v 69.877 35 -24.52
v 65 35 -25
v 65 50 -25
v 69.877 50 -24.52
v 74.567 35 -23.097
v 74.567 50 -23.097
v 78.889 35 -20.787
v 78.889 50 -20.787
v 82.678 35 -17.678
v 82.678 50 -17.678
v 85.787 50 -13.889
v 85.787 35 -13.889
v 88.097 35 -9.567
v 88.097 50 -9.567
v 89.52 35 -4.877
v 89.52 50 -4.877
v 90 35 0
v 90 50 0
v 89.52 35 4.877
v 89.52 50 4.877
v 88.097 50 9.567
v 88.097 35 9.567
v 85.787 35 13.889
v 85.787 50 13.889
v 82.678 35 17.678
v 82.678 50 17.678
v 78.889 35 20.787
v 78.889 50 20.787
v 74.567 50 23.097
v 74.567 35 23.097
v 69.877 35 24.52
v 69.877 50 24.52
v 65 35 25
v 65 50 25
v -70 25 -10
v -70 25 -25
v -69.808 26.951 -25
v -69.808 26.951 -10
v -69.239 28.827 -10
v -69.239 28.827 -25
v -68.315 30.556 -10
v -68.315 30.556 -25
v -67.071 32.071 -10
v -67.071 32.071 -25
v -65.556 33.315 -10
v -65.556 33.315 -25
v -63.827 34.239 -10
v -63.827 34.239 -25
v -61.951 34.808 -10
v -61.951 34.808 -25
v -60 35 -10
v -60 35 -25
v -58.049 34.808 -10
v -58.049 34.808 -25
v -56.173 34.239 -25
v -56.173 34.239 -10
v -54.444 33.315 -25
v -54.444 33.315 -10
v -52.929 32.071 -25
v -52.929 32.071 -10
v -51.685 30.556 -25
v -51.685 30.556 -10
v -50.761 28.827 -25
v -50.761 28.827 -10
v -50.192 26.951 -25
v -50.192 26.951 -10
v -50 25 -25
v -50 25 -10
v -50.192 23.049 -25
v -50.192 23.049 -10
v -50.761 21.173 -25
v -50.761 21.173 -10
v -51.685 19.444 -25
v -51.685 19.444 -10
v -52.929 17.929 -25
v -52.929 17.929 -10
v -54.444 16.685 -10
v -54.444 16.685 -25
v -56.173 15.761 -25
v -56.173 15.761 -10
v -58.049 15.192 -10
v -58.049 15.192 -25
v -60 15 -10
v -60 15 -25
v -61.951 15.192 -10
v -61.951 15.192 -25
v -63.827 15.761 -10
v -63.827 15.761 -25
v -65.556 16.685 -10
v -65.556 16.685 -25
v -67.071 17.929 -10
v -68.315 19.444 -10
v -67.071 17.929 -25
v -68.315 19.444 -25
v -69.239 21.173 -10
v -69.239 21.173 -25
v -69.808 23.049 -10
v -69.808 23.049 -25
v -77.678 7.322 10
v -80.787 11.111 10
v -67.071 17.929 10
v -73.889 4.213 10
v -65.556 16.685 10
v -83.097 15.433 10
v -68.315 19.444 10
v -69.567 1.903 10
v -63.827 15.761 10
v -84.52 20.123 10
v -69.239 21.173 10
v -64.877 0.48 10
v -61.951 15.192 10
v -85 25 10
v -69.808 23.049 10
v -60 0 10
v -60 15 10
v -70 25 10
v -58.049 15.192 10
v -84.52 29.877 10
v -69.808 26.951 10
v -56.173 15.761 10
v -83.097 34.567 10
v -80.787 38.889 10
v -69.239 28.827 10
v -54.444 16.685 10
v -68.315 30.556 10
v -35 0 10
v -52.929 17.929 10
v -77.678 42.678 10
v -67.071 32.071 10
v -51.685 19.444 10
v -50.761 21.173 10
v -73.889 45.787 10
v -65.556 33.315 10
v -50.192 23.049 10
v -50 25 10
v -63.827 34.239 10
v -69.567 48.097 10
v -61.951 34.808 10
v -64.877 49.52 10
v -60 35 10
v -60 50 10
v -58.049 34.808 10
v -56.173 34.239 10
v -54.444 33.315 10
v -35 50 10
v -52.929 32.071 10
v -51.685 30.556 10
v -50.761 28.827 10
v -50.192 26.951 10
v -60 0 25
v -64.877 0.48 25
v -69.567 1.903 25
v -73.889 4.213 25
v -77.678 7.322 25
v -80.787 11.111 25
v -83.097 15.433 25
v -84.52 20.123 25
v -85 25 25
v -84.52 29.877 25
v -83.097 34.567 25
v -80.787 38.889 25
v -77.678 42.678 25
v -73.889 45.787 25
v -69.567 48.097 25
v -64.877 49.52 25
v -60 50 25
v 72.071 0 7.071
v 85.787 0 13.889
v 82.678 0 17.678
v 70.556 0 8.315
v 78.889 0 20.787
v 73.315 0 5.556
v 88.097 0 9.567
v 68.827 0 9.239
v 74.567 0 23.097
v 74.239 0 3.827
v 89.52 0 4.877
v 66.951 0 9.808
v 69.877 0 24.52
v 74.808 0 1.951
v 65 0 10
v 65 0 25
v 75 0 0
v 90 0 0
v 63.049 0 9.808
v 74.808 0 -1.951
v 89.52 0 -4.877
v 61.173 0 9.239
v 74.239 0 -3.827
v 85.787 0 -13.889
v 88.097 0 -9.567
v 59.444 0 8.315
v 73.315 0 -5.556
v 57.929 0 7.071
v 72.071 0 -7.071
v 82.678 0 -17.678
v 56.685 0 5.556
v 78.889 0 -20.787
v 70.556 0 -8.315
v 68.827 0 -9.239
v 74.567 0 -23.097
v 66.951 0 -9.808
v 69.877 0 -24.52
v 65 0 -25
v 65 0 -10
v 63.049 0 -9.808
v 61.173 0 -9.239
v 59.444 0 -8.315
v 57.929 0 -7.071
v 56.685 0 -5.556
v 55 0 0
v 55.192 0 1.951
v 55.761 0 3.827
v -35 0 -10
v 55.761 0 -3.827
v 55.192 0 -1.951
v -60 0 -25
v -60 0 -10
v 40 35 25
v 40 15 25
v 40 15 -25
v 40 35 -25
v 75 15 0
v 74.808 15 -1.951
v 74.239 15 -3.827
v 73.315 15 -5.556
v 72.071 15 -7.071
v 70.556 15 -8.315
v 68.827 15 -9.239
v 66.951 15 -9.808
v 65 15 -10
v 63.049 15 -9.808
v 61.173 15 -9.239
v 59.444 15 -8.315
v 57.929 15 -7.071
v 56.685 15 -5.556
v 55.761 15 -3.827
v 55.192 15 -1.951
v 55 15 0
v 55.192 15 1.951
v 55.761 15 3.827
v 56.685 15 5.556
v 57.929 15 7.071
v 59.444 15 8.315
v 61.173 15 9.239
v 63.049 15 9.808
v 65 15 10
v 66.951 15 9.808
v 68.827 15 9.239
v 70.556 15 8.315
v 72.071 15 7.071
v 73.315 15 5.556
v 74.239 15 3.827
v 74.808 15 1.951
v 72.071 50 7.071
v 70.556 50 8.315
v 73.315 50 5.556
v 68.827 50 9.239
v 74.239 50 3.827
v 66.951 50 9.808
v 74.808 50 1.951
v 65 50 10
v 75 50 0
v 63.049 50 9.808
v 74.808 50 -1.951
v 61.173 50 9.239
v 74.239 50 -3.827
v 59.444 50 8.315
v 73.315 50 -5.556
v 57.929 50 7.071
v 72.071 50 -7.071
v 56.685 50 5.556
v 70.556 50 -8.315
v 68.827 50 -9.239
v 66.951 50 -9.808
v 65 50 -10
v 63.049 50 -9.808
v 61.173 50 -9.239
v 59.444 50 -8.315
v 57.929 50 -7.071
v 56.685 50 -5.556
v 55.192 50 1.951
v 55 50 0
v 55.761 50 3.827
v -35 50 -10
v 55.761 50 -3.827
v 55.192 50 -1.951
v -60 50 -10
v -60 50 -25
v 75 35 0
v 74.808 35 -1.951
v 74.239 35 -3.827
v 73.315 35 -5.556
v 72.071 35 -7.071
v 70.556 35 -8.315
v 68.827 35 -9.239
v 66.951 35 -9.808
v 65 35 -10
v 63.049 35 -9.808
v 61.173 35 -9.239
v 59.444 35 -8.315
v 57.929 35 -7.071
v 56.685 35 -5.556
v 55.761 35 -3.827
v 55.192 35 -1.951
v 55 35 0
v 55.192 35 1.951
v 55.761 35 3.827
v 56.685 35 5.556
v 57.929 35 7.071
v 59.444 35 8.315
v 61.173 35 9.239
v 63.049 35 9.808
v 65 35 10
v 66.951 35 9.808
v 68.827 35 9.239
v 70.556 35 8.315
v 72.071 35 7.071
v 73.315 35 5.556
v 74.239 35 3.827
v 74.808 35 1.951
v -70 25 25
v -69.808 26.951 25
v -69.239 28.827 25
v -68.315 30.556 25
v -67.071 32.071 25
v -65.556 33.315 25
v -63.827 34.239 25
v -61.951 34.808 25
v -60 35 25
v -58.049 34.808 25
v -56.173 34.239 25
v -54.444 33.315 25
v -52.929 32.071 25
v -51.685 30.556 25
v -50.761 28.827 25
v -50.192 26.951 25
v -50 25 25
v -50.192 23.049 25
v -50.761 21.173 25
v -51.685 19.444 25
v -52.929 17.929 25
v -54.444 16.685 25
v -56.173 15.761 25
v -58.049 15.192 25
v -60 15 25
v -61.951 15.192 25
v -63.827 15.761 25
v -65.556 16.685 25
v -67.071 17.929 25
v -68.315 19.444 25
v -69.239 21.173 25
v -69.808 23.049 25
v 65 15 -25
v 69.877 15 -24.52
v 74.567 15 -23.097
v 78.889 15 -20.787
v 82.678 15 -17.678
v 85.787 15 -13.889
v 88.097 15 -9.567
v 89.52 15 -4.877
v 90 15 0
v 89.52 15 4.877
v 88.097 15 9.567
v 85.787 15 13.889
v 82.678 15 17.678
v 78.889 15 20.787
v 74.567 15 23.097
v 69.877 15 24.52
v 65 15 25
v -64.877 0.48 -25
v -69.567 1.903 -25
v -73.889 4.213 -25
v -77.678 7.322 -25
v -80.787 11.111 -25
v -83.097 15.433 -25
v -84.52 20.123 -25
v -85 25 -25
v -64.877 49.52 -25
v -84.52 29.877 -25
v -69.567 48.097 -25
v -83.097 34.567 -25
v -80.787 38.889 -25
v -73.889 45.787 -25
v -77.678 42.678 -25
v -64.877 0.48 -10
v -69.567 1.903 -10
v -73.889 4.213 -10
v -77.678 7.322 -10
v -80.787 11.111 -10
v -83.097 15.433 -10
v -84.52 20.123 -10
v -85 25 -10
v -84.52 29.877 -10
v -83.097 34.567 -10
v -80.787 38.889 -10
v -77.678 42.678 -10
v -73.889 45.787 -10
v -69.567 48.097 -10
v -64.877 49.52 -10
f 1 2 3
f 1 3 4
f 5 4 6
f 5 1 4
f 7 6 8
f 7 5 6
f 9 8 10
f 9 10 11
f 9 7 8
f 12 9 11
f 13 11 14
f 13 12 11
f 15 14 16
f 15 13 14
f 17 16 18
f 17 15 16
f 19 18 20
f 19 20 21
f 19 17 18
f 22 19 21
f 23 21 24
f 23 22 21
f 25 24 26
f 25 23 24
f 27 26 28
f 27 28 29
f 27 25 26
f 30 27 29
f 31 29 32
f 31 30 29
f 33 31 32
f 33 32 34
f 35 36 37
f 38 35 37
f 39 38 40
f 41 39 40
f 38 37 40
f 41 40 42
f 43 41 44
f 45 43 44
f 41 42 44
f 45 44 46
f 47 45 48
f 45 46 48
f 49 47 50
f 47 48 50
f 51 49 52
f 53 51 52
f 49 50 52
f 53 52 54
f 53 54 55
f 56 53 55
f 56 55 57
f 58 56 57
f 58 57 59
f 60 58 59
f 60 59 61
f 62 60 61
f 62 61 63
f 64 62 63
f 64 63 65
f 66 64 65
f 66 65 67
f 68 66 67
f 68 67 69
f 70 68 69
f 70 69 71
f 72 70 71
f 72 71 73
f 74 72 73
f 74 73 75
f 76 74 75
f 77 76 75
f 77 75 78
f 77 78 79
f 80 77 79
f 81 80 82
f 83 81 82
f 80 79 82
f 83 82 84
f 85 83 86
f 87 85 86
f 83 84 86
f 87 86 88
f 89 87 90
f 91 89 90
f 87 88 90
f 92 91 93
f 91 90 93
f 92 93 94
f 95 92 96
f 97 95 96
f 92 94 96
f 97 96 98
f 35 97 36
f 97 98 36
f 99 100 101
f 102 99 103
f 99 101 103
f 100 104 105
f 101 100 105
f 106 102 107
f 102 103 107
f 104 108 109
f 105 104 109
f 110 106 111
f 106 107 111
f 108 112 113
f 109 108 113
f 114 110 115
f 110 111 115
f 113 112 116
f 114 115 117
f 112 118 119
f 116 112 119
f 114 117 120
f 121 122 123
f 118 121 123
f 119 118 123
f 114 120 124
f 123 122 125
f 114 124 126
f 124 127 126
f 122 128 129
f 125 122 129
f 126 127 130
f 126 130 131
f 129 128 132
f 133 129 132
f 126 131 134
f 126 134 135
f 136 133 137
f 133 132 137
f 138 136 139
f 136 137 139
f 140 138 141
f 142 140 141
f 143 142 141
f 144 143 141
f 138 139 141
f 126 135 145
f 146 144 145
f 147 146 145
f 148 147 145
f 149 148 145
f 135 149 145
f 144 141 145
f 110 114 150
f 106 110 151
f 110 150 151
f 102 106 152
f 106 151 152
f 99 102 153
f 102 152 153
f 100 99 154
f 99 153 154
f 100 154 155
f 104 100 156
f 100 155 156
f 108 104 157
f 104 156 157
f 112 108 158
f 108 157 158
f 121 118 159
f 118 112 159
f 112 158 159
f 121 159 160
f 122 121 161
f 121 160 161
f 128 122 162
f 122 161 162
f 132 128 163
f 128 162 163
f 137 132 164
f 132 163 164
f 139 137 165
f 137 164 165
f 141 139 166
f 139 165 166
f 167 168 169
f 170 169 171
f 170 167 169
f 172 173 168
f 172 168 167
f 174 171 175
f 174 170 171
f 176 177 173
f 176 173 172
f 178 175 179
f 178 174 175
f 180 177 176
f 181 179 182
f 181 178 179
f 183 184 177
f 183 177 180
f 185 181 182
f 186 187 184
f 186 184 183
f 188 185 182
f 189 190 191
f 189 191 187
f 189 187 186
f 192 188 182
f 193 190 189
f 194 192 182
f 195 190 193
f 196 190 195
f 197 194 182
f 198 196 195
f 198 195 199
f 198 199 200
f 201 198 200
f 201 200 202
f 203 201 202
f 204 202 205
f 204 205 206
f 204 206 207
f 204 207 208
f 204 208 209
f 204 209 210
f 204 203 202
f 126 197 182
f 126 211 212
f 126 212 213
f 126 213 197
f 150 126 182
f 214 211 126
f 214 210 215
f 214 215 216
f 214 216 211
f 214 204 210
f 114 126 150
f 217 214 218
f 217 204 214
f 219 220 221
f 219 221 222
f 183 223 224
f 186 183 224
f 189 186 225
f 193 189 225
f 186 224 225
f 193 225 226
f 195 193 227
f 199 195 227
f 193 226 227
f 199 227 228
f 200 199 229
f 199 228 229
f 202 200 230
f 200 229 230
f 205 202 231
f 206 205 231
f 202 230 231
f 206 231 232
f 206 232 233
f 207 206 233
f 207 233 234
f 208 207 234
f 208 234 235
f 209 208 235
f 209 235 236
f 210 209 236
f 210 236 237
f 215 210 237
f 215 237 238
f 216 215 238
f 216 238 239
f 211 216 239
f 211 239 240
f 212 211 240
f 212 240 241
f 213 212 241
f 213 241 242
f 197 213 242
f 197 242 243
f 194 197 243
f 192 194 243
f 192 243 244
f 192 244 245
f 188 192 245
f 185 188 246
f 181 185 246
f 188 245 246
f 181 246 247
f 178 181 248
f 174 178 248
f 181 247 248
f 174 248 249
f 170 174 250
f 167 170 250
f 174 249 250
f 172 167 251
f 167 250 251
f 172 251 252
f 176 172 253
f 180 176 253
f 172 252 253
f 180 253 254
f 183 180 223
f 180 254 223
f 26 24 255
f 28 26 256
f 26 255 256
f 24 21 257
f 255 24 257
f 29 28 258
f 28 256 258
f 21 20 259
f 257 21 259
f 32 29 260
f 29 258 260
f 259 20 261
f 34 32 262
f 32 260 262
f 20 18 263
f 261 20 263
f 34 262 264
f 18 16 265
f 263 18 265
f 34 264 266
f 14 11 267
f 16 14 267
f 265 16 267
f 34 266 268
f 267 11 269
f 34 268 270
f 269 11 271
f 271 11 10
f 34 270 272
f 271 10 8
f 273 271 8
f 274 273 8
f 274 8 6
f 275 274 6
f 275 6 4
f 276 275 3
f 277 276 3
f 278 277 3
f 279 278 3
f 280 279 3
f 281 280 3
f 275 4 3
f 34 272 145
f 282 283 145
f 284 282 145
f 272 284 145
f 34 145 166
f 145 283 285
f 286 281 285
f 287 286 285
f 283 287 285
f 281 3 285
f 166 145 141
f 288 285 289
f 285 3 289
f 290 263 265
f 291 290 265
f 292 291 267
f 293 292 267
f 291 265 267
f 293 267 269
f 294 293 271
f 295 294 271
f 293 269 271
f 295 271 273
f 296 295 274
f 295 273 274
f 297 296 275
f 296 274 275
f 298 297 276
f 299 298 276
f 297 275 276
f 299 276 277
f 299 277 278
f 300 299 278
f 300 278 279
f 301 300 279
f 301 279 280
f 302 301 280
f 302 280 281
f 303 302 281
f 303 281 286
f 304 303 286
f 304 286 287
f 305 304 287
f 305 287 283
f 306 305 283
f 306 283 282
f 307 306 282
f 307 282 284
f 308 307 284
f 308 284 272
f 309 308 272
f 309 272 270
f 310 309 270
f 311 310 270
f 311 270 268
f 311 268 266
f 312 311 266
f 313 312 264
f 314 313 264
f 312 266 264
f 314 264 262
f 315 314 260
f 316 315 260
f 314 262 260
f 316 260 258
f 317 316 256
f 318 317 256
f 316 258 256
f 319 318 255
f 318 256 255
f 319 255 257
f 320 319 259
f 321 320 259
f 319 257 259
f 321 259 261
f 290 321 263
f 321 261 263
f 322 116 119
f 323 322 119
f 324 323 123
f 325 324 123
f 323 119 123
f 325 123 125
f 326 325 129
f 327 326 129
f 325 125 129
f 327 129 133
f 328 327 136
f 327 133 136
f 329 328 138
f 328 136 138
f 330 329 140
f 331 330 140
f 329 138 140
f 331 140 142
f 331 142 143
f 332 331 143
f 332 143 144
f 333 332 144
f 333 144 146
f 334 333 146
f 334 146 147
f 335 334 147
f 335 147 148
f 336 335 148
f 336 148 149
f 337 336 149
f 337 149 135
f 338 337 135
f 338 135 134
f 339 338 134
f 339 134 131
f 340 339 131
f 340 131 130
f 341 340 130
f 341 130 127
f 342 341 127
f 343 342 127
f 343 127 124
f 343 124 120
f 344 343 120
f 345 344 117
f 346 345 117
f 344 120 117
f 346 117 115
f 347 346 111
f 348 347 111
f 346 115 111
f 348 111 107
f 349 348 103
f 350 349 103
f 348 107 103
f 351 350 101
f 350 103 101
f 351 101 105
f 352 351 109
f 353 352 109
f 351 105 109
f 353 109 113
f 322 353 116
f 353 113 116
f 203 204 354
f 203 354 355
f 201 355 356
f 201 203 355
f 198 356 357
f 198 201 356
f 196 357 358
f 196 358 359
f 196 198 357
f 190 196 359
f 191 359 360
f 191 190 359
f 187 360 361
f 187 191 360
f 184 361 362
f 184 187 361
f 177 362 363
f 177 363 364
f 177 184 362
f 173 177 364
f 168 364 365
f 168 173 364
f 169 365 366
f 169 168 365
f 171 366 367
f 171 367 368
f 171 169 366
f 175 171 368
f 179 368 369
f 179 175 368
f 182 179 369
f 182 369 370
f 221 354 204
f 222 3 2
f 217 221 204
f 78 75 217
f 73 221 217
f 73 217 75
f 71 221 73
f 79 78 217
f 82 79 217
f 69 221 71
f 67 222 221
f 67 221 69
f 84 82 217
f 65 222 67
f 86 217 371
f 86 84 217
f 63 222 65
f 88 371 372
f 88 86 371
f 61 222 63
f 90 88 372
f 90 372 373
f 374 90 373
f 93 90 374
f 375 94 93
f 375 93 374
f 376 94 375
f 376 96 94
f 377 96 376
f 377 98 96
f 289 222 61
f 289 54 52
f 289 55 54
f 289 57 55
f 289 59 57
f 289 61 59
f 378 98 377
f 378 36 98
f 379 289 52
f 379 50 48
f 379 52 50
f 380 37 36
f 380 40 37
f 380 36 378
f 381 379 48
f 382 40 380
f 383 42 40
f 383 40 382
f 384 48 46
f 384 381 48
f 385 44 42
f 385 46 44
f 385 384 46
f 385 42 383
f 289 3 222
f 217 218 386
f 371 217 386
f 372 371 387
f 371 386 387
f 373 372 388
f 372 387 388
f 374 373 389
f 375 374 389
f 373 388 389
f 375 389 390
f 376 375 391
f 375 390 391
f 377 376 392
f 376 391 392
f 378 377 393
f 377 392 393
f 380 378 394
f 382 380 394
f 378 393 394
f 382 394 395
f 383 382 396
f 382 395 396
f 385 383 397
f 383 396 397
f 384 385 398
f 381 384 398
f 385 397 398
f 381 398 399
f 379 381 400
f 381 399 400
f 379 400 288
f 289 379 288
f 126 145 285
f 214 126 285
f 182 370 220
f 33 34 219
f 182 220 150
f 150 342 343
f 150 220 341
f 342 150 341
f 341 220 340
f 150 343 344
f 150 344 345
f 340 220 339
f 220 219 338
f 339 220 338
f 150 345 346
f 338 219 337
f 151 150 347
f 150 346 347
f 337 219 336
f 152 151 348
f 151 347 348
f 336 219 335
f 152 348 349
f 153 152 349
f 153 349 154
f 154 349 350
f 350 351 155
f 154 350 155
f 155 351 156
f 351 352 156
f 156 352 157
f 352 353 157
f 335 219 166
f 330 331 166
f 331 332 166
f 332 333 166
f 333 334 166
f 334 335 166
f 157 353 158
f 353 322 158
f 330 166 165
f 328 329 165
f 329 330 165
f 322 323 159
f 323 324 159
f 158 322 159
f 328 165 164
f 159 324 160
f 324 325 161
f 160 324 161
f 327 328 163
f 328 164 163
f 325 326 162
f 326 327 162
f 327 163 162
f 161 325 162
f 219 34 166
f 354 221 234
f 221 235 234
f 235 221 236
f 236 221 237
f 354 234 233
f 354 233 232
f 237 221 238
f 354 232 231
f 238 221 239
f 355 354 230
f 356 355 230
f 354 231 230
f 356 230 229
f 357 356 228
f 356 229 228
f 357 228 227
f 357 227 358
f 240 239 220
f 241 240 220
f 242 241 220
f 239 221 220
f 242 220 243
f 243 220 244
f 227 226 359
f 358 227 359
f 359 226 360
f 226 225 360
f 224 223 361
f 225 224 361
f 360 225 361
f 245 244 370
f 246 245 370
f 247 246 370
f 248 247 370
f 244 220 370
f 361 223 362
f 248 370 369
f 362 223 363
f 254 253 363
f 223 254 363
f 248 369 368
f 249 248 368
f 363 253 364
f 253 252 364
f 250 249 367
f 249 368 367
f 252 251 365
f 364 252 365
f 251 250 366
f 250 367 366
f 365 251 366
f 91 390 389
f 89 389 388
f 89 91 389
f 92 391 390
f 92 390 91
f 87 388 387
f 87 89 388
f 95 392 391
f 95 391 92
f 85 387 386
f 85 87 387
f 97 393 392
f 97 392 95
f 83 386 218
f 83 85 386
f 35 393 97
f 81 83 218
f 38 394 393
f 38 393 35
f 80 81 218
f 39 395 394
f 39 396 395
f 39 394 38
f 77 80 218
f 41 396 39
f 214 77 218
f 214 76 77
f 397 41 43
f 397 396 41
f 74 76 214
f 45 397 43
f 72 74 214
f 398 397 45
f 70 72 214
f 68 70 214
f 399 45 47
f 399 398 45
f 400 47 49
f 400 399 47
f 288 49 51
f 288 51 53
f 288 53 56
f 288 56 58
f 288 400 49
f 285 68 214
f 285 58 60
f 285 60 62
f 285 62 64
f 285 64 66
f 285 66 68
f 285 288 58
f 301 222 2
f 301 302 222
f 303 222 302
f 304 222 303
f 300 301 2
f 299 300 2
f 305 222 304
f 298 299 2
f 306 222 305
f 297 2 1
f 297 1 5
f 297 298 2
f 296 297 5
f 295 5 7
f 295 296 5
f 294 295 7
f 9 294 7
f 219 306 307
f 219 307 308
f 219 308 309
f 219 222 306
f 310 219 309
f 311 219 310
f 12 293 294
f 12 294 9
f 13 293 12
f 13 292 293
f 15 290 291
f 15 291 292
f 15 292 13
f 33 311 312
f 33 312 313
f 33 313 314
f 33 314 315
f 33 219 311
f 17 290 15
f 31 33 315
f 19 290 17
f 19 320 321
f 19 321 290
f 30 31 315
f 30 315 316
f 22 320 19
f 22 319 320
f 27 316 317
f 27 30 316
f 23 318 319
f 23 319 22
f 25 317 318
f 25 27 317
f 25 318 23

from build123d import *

# Parameters (mm, degrees)
BOSS_EXTRUDE1_DEPTH = 50
BOSS_EXTRUDE4_DEPTH = 50
SKETCH5_W           = 50
SKETCH5_H           = 20
CUT_EXTRUDE2_DEPTH  = 50
SKETCH6_W           = 50
SKETCH6_H           = 20
CUT_EXTRUDE3_DEPTH  = 50
SKETCH7_R           = 10
CUT_EXTRUDE4_DEPTH  = 50
SKETCH8_R           = 10
CUT_EXTRUDE5_DEPTH  = 50


with BuildPart() as part:
    # Sketch2 → Boss-Extrude1 (new body)
    with BuildSketch(Plane(origin=(0, 0, 0), x_dir=(1, 0, 0), z_dir=(0, 1, 0))):
        with BuildLine():
            Line((-60, 25), (65, 25))
            ThreePointArc((65, 25), (90, 0), (65, -25))
            Line((65, -25), (-60, -25))
            Line((-60, -25), (-60, 25))
        make_face()
    extrude(amount=BOSS_EXTRUDE1_DEPTH)

    # Sketch3 → Boss-Extrude4 (add)
    with BuildSketch(Plane.XY.offset(25)):
        with BuildLine():
            Line((-60, 50), (-60, 0))
            ThreePointArc((-60, 0), (-85, 25), (-60, 50))
        make_face()
    extrude(amount=-BOSS_EXTRUDE4_DEPTH)

    # Sketch5 → Cut-Extrude2 (cut)
    with BuildSketch(Plane(origin=(0, 50, 0), x_dir=(1, 0, 0), z_dir=(0, 1, 0))):
        with Locations((-60, 0)):
            Rectangle(SKETCH5_W, SKETCH5_H)
    extrude(amount=-CUT_EXTRUDE2_DEPTH, mode=Mode.SUBTRACT)

    # Sketch6 → Cut-Extrude3 (cut)
    with BuildSketch(Plane.XY.offset(25)):
        with Locations((65, 25)):
            Rectangle(SKETCH6_W, SKETCH6_H)
    extrude(amount=-CUT_EXTRUDE3_DEPTH, mode=Mode.SUBTRACT)

    # Sketch7 → Cut-Extrude4 (cut)
    with BuildSketch(Plane(origin=(0, 50, 0), x_dir=(1, 0, 0), z_dir=(0, 1, 0))):
        with Locations((65, 0)):
            Circle(SKETCH7_R)
    extrude(amount=-CUT_EXTRUDE4_DEPTH, mode=Mode.SUBTRACT)

    # Sketch8 → Cut-Extrude5 (cut)
    with BuildSketch(Plane(origin=(0, 0, -25), x_dir=(-1, 0, 0), z_dir=(0, 0, -1))):
        with Locations((60, 25)):
            Circle(SKETCH8_R)
    extrude(amount=-CUT_EXTRUDE5_DEPTH, mode=Mode.SUBTRACT)


solid = part.part
